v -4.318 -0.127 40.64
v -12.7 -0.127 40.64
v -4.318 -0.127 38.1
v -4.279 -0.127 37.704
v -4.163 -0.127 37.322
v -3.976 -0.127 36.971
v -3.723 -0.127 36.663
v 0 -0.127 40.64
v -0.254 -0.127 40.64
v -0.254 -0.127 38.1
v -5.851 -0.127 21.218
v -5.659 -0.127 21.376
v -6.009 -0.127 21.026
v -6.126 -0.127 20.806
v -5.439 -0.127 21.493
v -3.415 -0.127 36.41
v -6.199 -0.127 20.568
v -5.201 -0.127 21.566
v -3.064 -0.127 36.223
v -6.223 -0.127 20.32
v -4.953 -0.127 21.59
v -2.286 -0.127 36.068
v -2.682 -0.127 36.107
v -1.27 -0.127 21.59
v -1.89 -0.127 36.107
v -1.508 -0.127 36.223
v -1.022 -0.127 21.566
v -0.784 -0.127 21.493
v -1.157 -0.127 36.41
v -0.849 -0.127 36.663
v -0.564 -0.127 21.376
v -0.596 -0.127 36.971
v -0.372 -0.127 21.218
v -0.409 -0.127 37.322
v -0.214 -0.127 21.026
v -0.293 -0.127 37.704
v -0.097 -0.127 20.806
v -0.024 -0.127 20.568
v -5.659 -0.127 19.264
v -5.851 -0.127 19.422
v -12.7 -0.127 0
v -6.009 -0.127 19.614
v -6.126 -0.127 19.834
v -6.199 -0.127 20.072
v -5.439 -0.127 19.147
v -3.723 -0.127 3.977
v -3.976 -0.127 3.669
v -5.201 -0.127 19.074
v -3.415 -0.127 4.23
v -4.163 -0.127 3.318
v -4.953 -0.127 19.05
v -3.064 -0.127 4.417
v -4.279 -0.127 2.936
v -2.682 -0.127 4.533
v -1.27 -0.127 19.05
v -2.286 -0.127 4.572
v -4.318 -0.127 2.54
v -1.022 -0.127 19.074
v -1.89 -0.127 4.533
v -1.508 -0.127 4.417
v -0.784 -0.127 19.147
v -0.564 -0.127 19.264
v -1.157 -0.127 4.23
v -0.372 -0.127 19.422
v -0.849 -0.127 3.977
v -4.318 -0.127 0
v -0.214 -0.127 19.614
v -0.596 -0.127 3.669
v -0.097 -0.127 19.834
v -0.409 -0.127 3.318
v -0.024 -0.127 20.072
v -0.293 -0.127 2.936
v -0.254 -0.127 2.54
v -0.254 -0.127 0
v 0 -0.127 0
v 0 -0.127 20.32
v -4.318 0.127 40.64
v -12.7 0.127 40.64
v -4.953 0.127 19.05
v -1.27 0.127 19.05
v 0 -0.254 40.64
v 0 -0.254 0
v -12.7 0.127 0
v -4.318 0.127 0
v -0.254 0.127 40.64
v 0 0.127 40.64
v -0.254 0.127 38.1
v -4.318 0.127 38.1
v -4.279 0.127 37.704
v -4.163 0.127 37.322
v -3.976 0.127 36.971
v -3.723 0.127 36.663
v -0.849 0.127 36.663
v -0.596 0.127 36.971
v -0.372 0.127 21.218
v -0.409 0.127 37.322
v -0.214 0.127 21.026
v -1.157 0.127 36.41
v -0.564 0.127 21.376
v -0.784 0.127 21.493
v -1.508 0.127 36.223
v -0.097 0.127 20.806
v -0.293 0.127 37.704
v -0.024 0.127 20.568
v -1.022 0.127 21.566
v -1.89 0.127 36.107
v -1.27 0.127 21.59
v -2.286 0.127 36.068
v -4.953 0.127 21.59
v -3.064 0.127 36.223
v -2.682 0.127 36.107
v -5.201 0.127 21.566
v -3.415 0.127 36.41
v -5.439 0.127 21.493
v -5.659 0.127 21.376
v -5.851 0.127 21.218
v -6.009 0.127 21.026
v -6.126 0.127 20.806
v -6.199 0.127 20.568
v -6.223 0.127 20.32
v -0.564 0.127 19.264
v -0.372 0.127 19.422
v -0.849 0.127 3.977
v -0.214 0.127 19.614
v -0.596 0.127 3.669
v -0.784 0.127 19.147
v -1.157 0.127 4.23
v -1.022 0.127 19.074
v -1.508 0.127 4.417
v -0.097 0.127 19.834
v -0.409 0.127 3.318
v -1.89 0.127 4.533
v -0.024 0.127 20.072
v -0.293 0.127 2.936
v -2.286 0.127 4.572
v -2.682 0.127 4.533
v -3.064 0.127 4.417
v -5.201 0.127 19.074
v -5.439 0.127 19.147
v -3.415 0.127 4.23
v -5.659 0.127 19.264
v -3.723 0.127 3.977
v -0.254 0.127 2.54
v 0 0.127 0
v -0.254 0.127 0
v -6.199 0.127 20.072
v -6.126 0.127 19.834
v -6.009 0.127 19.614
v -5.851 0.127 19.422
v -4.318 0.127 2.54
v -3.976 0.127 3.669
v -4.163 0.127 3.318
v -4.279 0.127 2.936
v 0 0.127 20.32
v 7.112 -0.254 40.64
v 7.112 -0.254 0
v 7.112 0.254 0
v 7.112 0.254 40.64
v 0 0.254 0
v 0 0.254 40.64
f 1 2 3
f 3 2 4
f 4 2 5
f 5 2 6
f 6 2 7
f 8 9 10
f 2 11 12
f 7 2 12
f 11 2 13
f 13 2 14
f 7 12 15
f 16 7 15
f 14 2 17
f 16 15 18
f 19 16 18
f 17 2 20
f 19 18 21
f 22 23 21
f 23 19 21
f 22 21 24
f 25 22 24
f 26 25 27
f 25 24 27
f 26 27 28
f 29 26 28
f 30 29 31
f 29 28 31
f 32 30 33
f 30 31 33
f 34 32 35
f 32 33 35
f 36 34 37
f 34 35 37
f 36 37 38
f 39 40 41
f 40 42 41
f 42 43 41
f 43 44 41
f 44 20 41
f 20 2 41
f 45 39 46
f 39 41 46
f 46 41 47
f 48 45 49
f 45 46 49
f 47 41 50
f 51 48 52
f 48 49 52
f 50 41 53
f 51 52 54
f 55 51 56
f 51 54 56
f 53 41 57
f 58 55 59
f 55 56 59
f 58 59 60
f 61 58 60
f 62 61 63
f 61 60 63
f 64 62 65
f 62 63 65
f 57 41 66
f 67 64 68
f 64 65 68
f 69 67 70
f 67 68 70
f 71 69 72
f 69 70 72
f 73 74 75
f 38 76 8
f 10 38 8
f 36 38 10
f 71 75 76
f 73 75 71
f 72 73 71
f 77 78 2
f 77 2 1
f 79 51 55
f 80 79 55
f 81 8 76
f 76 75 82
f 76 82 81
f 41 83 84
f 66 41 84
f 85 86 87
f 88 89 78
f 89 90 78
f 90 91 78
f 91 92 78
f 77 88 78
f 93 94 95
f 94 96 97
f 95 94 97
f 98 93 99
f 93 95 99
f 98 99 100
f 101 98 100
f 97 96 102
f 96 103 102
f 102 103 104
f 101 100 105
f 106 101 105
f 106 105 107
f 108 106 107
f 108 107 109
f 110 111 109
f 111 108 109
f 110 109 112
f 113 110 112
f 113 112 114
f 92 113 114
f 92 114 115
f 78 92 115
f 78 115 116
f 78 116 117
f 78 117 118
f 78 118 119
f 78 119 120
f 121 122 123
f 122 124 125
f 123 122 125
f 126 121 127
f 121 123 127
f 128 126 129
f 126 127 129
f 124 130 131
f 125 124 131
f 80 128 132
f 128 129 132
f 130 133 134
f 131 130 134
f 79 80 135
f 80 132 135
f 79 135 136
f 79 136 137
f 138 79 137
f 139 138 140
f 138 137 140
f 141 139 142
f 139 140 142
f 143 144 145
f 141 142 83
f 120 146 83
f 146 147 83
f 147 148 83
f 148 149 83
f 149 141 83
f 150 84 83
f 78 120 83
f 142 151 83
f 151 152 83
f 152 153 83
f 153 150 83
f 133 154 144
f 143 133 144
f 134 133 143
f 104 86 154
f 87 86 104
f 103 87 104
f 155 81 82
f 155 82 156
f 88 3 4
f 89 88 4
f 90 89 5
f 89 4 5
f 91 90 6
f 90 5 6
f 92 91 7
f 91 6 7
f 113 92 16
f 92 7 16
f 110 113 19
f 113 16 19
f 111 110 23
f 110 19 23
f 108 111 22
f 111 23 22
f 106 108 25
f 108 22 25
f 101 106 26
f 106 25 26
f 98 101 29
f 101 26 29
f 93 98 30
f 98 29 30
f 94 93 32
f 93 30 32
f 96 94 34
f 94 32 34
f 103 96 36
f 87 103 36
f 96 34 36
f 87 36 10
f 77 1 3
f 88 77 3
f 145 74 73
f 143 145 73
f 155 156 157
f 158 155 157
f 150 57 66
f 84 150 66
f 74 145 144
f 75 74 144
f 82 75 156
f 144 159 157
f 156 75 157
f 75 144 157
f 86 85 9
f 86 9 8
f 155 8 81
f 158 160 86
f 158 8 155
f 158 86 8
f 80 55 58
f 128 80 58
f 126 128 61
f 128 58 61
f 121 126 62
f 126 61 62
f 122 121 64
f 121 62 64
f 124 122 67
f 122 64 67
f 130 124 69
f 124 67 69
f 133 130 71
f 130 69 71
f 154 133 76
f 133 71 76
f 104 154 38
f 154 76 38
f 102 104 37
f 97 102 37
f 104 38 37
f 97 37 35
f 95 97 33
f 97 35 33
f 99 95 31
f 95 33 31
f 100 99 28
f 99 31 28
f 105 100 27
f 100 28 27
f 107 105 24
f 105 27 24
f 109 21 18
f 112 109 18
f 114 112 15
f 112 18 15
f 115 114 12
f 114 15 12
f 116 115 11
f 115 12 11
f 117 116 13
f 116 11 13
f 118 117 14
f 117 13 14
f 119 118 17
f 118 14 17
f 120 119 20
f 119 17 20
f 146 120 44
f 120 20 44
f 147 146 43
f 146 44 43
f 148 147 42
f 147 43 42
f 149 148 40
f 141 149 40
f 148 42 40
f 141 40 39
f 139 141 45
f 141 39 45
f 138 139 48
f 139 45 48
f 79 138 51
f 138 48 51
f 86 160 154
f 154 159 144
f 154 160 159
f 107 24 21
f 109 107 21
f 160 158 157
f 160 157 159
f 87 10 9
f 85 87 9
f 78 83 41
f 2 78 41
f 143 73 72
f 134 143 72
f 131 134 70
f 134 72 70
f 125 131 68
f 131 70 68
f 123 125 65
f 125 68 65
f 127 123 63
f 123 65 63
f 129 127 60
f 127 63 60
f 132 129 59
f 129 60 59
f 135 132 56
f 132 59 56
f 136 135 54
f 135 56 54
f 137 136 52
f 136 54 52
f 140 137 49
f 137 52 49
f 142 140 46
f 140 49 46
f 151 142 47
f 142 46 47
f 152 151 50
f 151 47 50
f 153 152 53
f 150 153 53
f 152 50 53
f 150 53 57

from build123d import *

# Parameters (mm, degrees)
F1_DEPTH      = 40.64
F3_DEPTH      = 0.255
F3_DEPTH_BACK = 0.255


with BuildPart() as f1:
    # F0 (on Top) → F1 (new body)
    with BuildSketch(Plane.XY):
        Polygon((0, 0.127), (-12.7, 0.127), (-12.7, -0.127), (0, -0.127), (0, -0.254), (7.112, -0.254), (7.112, 0.254), (0, 0.254), align=None)
    extrude(amount=F1_DEPTH)

    # F2 (on Front) → F3 (cut, two sides)
    with BuildSketch(Plane.XZ) as f3_sk:
        with BuildLine():
            Line((-4.318, 40.64), (-4.318, 38.1))
            ThreePointArc((-4.318, 38.1), (-2.286, 36.068), (-0.254, 38.1))
            Line((-0.254, 38.1), (-0.254, 40.64))
            Line((-0.254, 40.64), (-4.318, 40.64))
        make_face()
        with BuildLine():
            Line((-4.318, 2.54), (-4.318, 0))
            Line((-4.318, 0), (-0.254, 0))
            Line((-0.254, 0), (-0.254, 2.54))
            ThreePointArc((-0.254, 2.54), (-2.286, 4.572), (-4.318, 2.54))
        make_face()
        with BuildLine():
            Line((-1.27, 21.59), (-4.953, 21.59))
            ThreePointArc((-4.953, 21.59), (-6.223, 20.32), (-4.953, 19.05))
            Line((-4.953, 19.05), (-1.27, 19.05))
            ThreePointArc((-1.27, 19.05), (0, 20.32), (-1.27, 21.59))
        make_face()
    extrude(amount=-F3_DEPTH, mode=Mode.SUBTRACT)
    extrude(f3_sk.sketch, amount=F3_DEPTH_BACK, mode=Mode.SUBTRACT)


solid = f1.part
